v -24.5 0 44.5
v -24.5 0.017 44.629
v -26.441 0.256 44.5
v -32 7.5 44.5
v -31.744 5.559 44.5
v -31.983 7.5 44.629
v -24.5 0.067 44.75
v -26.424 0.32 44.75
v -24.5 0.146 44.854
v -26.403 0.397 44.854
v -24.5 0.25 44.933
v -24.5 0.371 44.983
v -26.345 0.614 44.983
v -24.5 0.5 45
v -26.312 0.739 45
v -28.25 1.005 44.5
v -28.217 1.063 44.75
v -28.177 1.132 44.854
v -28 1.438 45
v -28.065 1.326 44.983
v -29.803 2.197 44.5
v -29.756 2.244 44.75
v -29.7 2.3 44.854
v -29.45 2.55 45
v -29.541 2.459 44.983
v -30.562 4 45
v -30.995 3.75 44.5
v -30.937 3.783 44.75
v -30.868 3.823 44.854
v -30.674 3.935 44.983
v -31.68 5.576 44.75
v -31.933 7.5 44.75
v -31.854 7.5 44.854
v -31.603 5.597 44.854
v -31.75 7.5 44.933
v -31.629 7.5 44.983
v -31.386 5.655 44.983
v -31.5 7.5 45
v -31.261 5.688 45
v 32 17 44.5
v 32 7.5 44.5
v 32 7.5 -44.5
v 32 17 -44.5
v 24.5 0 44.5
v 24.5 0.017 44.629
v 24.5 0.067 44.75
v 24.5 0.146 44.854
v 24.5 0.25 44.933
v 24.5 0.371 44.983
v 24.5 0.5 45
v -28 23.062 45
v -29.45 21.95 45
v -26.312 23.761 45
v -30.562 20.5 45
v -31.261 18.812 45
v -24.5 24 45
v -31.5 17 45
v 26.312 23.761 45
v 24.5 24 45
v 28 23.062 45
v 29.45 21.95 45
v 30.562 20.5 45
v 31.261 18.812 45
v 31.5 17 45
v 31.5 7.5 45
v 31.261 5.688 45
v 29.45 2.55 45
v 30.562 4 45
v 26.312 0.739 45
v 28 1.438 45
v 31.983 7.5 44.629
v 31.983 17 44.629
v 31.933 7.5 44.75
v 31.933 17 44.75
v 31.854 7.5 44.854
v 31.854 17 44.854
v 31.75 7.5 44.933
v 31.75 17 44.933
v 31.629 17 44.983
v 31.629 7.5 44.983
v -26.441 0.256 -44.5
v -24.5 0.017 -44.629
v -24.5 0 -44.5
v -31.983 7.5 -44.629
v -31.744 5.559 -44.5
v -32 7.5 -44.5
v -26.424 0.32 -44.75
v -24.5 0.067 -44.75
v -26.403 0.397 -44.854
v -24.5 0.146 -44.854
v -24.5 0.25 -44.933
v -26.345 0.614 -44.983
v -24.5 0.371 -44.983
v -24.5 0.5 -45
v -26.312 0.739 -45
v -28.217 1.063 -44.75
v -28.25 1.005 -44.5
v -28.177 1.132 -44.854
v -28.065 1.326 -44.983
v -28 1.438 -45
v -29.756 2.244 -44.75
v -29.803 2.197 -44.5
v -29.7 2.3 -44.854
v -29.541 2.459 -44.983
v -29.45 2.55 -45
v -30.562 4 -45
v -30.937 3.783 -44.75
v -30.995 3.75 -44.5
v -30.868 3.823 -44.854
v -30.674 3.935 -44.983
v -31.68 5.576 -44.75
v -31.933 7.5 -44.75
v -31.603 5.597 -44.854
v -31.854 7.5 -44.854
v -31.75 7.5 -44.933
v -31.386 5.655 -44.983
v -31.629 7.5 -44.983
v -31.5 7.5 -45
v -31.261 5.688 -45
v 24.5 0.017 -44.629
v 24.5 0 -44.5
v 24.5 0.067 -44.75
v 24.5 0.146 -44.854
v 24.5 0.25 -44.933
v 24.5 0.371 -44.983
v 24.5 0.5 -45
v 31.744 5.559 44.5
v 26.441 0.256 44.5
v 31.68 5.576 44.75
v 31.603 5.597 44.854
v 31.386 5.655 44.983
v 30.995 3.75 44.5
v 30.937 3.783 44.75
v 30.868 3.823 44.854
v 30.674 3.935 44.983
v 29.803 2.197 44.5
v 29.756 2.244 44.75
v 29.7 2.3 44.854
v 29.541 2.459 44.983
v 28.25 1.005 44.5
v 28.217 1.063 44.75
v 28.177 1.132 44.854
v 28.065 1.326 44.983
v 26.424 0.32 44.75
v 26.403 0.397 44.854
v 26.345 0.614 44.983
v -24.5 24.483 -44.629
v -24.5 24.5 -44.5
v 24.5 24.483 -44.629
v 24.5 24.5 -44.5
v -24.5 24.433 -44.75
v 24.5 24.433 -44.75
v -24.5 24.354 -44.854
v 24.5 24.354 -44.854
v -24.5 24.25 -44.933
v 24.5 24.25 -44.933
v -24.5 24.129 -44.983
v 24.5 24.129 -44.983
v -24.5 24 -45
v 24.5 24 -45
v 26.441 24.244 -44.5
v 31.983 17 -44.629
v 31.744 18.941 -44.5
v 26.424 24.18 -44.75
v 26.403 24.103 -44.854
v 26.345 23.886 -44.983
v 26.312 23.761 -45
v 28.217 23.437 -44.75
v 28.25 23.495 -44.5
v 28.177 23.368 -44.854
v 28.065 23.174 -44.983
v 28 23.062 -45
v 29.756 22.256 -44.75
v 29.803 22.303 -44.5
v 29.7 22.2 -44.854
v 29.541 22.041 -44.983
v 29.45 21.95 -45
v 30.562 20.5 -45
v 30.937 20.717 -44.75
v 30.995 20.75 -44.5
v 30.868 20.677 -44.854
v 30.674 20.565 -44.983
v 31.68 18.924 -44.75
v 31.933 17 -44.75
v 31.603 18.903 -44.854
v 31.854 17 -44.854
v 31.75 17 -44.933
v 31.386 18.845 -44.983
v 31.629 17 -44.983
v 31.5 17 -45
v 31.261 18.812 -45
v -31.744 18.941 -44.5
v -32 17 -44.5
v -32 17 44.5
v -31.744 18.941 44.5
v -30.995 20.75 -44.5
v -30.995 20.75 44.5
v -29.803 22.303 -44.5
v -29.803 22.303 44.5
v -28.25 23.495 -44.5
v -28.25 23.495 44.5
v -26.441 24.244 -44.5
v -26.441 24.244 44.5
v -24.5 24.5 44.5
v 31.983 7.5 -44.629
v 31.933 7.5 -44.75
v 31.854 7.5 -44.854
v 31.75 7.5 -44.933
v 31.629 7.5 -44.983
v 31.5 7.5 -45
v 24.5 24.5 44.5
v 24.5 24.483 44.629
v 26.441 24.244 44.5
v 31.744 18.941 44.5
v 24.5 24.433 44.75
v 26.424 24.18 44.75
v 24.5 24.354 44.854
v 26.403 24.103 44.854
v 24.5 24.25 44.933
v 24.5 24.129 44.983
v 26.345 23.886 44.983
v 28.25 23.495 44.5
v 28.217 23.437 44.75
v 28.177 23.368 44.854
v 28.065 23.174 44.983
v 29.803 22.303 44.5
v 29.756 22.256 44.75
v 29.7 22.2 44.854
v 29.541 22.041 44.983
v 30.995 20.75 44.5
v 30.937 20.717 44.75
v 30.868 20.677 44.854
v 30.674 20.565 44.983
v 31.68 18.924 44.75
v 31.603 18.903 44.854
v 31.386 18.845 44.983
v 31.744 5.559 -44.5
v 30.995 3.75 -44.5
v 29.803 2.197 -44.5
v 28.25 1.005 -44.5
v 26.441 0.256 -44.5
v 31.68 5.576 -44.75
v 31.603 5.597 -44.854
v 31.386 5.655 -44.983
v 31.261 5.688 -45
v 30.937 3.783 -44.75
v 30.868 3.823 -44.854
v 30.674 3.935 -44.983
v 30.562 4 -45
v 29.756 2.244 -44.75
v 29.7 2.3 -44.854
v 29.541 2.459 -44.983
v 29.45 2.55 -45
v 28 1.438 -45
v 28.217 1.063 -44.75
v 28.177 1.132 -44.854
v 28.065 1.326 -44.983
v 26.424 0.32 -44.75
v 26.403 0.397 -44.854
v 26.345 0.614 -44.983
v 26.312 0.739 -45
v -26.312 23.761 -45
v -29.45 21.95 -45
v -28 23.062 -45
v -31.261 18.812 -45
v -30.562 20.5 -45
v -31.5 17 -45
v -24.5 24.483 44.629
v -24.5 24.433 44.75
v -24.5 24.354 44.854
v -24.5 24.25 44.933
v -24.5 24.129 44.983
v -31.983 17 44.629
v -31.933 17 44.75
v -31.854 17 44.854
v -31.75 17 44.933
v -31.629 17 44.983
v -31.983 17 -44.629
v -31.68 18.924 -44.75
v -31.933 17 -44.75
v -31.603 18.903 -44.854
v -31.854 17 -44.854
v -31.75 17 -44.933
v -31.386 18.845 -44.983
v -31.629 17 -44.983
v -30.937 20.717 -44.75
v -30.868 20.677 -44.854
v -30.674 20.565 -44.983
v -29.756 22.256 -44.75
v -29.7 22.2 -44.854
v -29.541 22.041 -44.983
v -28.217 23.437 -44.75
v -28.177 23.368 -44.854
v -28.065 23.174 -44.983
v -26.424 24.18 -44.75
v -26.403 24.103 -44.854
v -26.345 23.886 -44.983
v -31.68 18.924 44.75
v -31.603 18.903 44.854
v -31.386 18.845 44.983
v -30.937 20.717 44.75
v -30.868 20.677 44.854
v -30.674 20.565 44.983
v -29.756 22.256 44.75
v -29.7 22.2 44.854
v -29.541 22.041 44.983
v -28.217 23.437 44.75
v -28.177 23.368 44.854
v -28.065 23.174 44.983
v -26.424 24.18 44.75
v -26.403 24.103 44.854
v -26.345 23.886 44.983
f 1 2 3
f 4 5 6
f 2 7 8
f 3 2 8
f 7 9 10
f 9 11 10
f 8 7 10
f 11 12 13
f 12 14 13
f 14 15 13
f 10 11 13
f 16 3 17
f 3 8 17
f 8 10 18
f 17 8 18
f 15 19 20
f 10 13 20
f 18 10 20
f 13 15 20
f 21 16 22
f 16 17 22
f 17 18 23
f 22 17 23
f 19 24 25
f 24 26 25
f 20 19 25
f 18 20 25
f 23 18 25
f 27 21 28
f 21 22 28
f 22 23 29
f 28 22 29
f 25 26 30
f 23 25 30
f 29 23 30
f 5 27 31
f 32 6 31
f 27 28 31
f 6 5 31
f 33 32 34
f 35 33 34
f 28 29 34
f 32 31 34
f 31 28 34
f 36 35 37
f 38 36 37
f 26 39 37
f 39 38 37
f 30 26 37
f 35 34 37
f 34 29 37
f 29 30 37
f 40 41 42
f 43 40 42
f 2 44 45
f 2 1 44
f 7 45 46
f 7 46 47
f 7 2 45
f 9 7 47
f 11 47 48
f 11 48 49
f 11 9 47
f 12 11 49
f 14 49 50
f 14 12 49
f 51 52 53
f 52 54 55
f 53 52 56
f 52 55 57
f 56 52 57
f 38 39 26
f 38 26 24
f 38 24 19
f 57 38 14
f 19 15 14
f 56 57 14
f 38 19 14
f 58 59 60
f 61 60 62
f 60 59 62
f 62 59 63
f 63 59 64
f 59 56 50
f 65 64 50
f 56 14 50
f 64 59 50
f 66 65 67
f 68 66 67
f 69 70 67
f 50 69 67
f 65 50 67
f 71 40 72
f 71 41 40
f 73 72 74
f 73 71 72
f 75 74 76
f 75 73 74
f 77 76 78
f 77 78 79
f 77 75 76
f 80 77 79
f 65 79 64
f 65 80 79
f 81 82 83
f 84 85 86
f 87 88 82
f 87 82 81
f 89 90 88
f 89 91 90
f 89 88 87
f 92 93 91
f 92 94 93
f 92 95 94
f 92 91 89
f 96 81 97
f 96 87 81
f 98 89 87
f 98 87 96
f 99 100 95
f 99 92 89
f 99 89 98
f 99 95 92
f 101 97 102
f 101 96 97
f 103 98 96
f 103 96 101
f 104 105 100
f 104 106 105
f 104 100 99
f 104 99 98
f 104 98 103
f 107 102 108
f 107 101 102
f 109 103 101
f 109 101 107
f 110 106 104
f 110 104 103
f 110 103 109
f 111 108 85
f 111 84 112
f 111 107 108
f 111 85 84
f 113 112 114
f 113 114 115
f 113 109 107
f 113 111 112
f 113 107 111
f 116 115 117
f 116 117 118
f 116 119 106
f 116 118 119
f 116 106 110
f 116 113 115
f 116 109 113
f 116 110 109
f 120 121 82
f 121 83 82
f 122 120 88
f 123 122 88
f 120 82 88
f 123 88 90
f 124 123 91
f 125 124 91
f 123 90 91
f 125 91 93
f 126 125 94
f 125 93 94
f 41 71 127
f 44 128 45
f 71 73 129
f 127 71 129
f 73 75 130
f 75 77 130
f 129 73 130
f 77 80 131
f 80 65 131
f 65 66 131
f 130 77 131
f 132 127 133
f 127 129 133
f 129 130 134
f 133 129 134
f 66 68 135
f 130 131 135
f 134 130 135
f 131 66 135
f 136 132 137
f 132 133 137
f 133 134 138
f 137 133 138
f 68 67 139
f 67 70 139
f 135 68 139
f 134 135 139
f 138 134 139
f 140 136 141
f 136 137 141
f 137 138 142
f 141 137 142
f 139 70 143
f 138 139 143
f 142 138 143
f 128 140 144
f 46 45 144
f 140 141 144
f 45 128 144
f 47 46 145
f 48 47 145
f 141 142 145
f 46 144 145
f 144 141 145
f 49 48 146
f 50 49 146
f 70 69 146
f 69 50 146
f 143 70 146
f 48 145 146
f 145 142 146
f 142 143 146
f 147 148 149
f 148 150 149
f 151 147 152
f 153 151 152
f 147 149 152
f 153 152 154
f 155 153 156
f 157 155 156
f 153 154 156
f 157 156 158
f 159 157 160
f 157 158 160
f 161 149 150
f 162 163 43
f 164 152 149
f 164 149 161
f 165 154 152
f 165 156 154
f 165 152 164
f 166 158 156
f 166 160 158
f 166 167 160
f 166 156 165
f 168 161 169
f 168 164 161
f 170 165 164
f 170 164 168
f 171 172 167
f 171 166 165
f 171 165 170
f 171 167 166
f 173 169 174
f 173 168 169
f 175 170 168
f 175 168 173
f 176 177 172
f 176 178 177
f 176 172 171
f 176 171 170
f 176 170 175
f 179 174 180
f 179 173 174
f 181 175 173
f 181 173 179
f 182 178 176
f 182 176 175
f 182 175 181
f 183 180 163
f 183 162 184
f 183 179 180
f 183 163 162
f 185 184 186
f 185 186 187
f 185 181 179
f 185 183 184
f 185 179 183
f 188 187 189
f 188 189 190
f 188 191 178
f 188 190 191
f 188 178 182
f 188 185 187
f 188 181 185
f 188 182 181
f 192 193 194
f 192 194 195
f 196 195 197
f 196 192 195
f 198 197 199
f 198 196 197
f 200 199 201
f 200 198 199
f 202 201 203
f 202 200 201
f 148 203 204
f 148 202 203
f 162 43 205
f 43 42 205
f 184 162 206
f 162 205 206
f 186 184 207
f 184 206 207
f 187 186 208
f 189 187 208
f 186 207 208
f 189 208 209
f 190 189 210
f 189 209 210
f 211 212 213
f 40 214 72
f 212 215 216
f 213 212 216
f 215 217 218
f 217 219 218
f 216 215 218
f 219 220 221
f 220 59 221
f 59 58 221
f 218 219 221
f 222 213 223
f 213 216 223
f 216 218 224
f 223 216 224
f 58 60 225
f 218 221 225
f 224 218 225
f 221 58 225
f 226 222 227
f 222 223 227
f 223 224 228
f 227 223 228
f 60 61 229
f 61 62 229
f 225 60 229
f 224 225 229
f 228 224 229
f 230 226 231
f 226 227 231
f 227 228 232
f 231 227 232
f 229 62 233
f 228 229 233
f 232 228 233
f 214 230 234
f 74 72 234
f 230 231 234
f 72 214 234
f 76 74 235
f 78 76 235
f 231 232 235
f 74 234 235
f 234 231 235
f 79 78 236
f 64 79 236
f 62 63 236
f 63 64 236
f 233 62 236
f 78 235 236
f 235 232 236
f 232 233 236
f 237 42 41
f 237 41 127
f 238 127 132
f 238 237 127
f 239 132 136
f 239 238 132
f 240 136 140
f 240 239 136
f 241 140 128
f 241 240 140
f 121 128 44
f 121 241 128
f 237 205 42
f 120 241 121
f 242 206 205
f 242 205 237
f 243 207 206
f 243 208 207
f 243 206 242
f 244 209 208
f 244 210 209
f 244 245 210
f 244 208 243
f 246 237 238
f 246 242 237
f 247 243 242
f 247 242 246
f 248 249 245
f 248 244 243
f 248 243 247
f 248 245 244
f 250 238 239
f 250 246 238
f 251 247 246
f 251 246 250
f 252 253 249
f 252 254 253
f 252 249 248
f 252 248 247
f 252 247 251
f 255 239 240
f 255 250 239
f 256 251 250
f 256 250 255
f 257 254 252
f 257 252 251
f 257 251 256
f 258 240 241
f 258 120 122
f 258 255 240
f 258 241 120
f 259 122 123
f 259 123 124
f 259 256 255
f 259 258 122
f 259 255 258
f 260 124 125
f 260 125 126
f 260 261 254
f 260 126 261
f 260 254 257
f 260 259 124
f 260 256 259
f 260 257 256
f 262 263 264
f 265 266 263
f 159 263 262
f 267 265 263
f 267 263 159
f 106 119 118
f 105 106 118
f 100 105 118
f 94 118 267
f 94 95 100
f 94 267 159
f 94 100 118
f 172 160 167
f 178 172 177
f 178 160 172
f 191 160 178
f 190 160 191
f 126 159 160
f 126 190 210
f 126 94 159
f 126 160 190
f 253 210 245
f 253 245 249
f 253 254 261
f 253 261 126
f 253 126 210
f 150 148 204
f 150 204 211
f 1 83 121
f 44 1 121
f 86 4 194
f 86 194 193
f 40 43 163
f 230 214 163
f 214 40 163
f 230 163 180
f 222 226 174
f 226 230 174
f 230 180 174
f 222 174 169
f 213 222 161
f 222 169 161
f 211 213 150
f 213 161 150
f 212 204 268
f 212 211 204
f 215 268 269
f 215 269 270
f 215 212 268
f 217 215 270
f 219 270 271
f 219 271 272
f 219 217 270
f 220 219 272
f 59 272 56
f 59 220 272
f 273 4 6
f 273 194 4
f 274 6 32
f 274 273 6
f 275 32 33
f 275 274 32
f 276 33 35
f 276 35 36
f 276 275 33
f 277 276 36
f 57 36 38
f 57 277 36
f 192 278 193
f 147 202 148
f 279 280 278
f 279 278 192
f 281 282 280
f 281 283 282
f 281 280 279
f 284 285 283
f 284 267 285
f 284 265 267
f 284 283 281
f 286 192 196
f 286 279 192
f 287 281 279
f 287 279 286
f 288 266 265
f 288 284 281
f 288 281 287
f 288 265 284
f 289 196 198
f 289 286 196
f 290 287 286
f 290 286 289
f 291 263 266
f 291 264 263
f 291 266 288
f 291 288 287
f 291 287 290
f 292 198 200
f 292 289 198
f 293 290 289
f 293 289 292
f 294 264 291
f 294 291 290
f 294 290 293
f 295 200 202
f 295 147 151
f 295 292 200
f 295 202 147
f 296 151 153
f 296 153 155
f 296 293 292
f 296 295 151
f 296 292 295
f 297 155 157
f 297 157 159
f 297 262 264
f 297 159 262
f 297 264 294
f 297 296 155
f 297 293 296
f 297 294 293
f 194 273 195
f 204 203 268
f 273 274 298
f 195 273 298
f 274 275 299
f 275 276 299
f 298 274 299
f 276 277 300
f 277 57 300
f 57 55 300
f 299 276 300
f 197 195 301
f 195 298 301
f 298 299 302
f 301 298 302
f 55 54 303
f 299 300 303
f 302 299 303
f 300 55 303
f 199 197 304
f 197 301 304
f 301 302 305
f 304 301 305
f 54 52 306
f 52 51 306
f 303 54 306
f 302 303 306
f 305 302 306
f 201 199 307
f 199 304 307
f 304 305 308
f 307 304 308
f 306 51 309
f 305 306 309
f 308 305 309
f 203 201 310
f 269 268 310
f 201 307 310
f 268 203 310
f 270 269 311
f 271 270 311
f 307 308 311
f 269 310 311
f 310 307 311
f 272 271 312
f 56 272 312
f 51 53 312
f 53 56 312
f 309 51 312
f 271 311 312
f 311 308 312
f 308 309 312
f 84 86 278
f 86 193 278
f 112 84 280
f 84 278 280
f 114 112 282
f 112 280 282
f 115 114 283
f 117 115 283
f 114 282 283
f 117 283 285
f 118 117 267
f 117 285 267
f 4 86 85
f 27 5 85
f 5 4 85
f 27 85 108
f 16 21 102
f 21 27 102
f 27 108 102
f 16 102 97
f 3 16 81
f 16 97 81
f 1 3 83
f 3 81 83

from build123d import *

# Parameters (mm, degrees)
CROQUIS1_W              = 64
CROQUIS1_H              = 90
SALIENTE_EXTRUIR1_DEPTH = 24.5
REDONDEO1_R             = 7.5
REDONDEO2_R             = 0.5


with BuildPart() as part:
    # Croquis1 → Saliente-Extruir1 (new body)
    with BuildSketch(Plane(origin=(0, 0, 0), x_dir=(1, 0, 0), z_dir=(0, 1, 0))):
        Rectangle(CROQUIS1_W, CROQUIS1_H)
    extrude(amount=SALIENTE_EXTRUIR1_DEPTH)

    # Redondeo1
    redondeo1_edges = [part.edges().sort_by_distance(p)[0] for p in [
        (-32, 24.5, 0),
        (32, 24.5, 0),
        (-32, 0, 0),
        (32, 0, 0),
    ]]
    fillet(redondeo1_edges, radius=REDONDEO1_R)

    # Redondeo2
    redondeo2_edges = [part.edges().sort_by_distance(p)[0] for p in [
        (-32, 12.25, 45),
        (-32, 12.25, -45),
        (0, 0, 45),
        (32, 12.25, 45),
        (0, 24.5, 45),
        (29.803300859, 22.303300859, 45),
        (29.803300859, 2.196699141, 45),
        (-29.803300859, 22.303300859, 45),
        (-29.803300859, 2.196699141, 45),
        (0, 0, -45),
        (0, 24.5, -45),
        (32, 12.25, -45),
        (29.803300859, 22.303300859, -45),
        (29.803300859, 2.196699141, -45),
        (-29.803300859, 22.303300859, -45),
        (-29.803300859, 2.196699141, -45),
    ]]
    fillet(redondeo2_edges, radius=REDONDEO2_R)


solid = part.part
